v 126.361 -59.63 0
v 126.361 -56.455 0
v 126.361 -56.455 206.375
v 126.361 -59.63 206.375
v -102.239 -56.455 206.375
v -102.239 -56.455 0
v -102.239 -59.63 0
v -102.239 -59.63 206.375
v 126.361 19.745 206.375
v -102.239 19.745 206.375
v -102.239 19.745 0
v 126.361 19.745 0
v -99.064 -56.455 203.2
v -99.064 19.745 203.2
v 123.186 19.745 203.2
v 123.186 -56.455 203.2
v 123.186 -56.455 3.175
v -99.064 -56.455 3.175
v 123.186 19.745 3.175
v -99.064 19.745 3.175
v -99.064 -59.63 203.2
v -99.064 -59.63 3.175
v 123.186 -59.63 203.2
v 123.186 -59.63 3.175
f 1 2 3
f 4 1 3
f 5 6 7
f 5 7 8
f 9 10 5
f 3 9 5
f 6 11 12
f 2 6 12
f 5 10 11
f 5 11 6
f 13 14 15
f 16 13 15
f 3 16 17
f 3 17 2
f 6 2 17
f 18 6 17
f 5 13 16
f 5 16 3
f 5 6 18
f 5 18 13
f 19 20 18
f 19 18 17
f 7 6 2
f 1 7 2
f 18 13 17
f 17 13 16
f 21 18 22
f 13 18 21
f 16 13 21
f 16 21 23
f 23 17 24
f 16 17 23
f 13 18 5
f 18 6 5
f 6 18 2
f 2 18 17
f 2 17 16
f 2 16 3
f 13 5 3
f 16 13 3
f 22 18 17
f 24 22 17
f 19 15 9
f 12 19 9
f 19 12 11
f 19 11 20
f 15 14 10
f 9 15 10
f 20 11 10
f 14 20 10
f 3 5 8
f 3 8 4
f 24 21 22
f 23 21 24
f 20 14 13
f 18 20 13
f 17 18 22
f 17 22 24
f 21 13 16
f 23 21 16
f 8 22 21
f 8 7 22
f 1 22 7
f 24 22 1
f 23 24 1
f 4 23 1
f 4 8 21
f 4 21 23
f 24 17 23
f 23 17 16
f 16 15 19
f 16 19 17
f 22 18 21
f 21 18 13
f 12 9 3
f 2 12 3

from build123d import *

# Parameters (mm, degrees)
F0_W      = 228.6
F0_H      = 76.2
F1_DEPTH  = 3.175
F2_W      = 76.2
F2_H      = 203.2
F3_DEPTH  = 3.175
F8_W      = 222.25
F8_H      = 200.025
F9_DEPTH  = 3.175
F10_W     = 228.6
F10_H     = 206.375
F10_W_2   = 222.25
F10_H_2   = 200.025
F11_DEPTH = 3.175


with BuildPart() as f1:
    # F0 (on Top) → F1 (new body)
    with BuildSketch(Plane.XY):
        with Locations((12.060761, -18.355442)):
            Rectangle(F0_W, F0_H)
    extrude(amount=F1_DEPTH)

    # F5: F3 across plane


with BuildPart() as f3:
    # F2 (on face) → F3 (new body)
    with BuildSketch(Plane(origin=(-102.239239, 0, 0), x_dir=(0, -1, 0), z_dir=(-1, 0, 0))):
        with Locations((18.355442, 104.775)):
            Rectangle(F2_W, F2_H)
    extrude(amount=-F3_DEPTH)


with BuildPart() as f1_1:
    add(f1.part)
    add(f3.part.mirror(Plane(origin=(12.060761, -18.355442, 1.5875), x_dir=(0, 1, 0), z_dir=(1, 0, 0))))


    add(f3.part)  # F7 merges F3
    # F7: F1 across plane


with BuildPart() as f1_2:
    add(f1_1.part)
    add(f1_1.part.mirror(Plane(origin=(-44.295489, -18.355442, 103.1875), x_dir=(1, 0, 0), z_dir=(0, 0, 1))))


with BuildPart() as f9:
    # F8 (on face) → F9 (new body)
    with BuildSketch(Plane.XZ.offset(56.455442)):
        with Locations((12.060761, 103.1875)):
            Rectangle(F8_W, F8_H)
    extrude(amount=F9_DEPTH)


with BuildPart() as f11:
    # F10 (on face) → F11 (new body, through all)
    with BuildSketch(Plane.XZ.offset(56.455442)):
        with Locations((12.060761, 103.1875)):
            Rectangle(F10_W, F10_H)
        with Locations((12.060761, 103.1875)):
            Rectangle(F10_W_2, F10_H_2, mode=Mode.SUBTRACT)
    extrude(amount=F11_DEPTH)


solid = Compound([f1_2.part, f9.part, f11.part])
